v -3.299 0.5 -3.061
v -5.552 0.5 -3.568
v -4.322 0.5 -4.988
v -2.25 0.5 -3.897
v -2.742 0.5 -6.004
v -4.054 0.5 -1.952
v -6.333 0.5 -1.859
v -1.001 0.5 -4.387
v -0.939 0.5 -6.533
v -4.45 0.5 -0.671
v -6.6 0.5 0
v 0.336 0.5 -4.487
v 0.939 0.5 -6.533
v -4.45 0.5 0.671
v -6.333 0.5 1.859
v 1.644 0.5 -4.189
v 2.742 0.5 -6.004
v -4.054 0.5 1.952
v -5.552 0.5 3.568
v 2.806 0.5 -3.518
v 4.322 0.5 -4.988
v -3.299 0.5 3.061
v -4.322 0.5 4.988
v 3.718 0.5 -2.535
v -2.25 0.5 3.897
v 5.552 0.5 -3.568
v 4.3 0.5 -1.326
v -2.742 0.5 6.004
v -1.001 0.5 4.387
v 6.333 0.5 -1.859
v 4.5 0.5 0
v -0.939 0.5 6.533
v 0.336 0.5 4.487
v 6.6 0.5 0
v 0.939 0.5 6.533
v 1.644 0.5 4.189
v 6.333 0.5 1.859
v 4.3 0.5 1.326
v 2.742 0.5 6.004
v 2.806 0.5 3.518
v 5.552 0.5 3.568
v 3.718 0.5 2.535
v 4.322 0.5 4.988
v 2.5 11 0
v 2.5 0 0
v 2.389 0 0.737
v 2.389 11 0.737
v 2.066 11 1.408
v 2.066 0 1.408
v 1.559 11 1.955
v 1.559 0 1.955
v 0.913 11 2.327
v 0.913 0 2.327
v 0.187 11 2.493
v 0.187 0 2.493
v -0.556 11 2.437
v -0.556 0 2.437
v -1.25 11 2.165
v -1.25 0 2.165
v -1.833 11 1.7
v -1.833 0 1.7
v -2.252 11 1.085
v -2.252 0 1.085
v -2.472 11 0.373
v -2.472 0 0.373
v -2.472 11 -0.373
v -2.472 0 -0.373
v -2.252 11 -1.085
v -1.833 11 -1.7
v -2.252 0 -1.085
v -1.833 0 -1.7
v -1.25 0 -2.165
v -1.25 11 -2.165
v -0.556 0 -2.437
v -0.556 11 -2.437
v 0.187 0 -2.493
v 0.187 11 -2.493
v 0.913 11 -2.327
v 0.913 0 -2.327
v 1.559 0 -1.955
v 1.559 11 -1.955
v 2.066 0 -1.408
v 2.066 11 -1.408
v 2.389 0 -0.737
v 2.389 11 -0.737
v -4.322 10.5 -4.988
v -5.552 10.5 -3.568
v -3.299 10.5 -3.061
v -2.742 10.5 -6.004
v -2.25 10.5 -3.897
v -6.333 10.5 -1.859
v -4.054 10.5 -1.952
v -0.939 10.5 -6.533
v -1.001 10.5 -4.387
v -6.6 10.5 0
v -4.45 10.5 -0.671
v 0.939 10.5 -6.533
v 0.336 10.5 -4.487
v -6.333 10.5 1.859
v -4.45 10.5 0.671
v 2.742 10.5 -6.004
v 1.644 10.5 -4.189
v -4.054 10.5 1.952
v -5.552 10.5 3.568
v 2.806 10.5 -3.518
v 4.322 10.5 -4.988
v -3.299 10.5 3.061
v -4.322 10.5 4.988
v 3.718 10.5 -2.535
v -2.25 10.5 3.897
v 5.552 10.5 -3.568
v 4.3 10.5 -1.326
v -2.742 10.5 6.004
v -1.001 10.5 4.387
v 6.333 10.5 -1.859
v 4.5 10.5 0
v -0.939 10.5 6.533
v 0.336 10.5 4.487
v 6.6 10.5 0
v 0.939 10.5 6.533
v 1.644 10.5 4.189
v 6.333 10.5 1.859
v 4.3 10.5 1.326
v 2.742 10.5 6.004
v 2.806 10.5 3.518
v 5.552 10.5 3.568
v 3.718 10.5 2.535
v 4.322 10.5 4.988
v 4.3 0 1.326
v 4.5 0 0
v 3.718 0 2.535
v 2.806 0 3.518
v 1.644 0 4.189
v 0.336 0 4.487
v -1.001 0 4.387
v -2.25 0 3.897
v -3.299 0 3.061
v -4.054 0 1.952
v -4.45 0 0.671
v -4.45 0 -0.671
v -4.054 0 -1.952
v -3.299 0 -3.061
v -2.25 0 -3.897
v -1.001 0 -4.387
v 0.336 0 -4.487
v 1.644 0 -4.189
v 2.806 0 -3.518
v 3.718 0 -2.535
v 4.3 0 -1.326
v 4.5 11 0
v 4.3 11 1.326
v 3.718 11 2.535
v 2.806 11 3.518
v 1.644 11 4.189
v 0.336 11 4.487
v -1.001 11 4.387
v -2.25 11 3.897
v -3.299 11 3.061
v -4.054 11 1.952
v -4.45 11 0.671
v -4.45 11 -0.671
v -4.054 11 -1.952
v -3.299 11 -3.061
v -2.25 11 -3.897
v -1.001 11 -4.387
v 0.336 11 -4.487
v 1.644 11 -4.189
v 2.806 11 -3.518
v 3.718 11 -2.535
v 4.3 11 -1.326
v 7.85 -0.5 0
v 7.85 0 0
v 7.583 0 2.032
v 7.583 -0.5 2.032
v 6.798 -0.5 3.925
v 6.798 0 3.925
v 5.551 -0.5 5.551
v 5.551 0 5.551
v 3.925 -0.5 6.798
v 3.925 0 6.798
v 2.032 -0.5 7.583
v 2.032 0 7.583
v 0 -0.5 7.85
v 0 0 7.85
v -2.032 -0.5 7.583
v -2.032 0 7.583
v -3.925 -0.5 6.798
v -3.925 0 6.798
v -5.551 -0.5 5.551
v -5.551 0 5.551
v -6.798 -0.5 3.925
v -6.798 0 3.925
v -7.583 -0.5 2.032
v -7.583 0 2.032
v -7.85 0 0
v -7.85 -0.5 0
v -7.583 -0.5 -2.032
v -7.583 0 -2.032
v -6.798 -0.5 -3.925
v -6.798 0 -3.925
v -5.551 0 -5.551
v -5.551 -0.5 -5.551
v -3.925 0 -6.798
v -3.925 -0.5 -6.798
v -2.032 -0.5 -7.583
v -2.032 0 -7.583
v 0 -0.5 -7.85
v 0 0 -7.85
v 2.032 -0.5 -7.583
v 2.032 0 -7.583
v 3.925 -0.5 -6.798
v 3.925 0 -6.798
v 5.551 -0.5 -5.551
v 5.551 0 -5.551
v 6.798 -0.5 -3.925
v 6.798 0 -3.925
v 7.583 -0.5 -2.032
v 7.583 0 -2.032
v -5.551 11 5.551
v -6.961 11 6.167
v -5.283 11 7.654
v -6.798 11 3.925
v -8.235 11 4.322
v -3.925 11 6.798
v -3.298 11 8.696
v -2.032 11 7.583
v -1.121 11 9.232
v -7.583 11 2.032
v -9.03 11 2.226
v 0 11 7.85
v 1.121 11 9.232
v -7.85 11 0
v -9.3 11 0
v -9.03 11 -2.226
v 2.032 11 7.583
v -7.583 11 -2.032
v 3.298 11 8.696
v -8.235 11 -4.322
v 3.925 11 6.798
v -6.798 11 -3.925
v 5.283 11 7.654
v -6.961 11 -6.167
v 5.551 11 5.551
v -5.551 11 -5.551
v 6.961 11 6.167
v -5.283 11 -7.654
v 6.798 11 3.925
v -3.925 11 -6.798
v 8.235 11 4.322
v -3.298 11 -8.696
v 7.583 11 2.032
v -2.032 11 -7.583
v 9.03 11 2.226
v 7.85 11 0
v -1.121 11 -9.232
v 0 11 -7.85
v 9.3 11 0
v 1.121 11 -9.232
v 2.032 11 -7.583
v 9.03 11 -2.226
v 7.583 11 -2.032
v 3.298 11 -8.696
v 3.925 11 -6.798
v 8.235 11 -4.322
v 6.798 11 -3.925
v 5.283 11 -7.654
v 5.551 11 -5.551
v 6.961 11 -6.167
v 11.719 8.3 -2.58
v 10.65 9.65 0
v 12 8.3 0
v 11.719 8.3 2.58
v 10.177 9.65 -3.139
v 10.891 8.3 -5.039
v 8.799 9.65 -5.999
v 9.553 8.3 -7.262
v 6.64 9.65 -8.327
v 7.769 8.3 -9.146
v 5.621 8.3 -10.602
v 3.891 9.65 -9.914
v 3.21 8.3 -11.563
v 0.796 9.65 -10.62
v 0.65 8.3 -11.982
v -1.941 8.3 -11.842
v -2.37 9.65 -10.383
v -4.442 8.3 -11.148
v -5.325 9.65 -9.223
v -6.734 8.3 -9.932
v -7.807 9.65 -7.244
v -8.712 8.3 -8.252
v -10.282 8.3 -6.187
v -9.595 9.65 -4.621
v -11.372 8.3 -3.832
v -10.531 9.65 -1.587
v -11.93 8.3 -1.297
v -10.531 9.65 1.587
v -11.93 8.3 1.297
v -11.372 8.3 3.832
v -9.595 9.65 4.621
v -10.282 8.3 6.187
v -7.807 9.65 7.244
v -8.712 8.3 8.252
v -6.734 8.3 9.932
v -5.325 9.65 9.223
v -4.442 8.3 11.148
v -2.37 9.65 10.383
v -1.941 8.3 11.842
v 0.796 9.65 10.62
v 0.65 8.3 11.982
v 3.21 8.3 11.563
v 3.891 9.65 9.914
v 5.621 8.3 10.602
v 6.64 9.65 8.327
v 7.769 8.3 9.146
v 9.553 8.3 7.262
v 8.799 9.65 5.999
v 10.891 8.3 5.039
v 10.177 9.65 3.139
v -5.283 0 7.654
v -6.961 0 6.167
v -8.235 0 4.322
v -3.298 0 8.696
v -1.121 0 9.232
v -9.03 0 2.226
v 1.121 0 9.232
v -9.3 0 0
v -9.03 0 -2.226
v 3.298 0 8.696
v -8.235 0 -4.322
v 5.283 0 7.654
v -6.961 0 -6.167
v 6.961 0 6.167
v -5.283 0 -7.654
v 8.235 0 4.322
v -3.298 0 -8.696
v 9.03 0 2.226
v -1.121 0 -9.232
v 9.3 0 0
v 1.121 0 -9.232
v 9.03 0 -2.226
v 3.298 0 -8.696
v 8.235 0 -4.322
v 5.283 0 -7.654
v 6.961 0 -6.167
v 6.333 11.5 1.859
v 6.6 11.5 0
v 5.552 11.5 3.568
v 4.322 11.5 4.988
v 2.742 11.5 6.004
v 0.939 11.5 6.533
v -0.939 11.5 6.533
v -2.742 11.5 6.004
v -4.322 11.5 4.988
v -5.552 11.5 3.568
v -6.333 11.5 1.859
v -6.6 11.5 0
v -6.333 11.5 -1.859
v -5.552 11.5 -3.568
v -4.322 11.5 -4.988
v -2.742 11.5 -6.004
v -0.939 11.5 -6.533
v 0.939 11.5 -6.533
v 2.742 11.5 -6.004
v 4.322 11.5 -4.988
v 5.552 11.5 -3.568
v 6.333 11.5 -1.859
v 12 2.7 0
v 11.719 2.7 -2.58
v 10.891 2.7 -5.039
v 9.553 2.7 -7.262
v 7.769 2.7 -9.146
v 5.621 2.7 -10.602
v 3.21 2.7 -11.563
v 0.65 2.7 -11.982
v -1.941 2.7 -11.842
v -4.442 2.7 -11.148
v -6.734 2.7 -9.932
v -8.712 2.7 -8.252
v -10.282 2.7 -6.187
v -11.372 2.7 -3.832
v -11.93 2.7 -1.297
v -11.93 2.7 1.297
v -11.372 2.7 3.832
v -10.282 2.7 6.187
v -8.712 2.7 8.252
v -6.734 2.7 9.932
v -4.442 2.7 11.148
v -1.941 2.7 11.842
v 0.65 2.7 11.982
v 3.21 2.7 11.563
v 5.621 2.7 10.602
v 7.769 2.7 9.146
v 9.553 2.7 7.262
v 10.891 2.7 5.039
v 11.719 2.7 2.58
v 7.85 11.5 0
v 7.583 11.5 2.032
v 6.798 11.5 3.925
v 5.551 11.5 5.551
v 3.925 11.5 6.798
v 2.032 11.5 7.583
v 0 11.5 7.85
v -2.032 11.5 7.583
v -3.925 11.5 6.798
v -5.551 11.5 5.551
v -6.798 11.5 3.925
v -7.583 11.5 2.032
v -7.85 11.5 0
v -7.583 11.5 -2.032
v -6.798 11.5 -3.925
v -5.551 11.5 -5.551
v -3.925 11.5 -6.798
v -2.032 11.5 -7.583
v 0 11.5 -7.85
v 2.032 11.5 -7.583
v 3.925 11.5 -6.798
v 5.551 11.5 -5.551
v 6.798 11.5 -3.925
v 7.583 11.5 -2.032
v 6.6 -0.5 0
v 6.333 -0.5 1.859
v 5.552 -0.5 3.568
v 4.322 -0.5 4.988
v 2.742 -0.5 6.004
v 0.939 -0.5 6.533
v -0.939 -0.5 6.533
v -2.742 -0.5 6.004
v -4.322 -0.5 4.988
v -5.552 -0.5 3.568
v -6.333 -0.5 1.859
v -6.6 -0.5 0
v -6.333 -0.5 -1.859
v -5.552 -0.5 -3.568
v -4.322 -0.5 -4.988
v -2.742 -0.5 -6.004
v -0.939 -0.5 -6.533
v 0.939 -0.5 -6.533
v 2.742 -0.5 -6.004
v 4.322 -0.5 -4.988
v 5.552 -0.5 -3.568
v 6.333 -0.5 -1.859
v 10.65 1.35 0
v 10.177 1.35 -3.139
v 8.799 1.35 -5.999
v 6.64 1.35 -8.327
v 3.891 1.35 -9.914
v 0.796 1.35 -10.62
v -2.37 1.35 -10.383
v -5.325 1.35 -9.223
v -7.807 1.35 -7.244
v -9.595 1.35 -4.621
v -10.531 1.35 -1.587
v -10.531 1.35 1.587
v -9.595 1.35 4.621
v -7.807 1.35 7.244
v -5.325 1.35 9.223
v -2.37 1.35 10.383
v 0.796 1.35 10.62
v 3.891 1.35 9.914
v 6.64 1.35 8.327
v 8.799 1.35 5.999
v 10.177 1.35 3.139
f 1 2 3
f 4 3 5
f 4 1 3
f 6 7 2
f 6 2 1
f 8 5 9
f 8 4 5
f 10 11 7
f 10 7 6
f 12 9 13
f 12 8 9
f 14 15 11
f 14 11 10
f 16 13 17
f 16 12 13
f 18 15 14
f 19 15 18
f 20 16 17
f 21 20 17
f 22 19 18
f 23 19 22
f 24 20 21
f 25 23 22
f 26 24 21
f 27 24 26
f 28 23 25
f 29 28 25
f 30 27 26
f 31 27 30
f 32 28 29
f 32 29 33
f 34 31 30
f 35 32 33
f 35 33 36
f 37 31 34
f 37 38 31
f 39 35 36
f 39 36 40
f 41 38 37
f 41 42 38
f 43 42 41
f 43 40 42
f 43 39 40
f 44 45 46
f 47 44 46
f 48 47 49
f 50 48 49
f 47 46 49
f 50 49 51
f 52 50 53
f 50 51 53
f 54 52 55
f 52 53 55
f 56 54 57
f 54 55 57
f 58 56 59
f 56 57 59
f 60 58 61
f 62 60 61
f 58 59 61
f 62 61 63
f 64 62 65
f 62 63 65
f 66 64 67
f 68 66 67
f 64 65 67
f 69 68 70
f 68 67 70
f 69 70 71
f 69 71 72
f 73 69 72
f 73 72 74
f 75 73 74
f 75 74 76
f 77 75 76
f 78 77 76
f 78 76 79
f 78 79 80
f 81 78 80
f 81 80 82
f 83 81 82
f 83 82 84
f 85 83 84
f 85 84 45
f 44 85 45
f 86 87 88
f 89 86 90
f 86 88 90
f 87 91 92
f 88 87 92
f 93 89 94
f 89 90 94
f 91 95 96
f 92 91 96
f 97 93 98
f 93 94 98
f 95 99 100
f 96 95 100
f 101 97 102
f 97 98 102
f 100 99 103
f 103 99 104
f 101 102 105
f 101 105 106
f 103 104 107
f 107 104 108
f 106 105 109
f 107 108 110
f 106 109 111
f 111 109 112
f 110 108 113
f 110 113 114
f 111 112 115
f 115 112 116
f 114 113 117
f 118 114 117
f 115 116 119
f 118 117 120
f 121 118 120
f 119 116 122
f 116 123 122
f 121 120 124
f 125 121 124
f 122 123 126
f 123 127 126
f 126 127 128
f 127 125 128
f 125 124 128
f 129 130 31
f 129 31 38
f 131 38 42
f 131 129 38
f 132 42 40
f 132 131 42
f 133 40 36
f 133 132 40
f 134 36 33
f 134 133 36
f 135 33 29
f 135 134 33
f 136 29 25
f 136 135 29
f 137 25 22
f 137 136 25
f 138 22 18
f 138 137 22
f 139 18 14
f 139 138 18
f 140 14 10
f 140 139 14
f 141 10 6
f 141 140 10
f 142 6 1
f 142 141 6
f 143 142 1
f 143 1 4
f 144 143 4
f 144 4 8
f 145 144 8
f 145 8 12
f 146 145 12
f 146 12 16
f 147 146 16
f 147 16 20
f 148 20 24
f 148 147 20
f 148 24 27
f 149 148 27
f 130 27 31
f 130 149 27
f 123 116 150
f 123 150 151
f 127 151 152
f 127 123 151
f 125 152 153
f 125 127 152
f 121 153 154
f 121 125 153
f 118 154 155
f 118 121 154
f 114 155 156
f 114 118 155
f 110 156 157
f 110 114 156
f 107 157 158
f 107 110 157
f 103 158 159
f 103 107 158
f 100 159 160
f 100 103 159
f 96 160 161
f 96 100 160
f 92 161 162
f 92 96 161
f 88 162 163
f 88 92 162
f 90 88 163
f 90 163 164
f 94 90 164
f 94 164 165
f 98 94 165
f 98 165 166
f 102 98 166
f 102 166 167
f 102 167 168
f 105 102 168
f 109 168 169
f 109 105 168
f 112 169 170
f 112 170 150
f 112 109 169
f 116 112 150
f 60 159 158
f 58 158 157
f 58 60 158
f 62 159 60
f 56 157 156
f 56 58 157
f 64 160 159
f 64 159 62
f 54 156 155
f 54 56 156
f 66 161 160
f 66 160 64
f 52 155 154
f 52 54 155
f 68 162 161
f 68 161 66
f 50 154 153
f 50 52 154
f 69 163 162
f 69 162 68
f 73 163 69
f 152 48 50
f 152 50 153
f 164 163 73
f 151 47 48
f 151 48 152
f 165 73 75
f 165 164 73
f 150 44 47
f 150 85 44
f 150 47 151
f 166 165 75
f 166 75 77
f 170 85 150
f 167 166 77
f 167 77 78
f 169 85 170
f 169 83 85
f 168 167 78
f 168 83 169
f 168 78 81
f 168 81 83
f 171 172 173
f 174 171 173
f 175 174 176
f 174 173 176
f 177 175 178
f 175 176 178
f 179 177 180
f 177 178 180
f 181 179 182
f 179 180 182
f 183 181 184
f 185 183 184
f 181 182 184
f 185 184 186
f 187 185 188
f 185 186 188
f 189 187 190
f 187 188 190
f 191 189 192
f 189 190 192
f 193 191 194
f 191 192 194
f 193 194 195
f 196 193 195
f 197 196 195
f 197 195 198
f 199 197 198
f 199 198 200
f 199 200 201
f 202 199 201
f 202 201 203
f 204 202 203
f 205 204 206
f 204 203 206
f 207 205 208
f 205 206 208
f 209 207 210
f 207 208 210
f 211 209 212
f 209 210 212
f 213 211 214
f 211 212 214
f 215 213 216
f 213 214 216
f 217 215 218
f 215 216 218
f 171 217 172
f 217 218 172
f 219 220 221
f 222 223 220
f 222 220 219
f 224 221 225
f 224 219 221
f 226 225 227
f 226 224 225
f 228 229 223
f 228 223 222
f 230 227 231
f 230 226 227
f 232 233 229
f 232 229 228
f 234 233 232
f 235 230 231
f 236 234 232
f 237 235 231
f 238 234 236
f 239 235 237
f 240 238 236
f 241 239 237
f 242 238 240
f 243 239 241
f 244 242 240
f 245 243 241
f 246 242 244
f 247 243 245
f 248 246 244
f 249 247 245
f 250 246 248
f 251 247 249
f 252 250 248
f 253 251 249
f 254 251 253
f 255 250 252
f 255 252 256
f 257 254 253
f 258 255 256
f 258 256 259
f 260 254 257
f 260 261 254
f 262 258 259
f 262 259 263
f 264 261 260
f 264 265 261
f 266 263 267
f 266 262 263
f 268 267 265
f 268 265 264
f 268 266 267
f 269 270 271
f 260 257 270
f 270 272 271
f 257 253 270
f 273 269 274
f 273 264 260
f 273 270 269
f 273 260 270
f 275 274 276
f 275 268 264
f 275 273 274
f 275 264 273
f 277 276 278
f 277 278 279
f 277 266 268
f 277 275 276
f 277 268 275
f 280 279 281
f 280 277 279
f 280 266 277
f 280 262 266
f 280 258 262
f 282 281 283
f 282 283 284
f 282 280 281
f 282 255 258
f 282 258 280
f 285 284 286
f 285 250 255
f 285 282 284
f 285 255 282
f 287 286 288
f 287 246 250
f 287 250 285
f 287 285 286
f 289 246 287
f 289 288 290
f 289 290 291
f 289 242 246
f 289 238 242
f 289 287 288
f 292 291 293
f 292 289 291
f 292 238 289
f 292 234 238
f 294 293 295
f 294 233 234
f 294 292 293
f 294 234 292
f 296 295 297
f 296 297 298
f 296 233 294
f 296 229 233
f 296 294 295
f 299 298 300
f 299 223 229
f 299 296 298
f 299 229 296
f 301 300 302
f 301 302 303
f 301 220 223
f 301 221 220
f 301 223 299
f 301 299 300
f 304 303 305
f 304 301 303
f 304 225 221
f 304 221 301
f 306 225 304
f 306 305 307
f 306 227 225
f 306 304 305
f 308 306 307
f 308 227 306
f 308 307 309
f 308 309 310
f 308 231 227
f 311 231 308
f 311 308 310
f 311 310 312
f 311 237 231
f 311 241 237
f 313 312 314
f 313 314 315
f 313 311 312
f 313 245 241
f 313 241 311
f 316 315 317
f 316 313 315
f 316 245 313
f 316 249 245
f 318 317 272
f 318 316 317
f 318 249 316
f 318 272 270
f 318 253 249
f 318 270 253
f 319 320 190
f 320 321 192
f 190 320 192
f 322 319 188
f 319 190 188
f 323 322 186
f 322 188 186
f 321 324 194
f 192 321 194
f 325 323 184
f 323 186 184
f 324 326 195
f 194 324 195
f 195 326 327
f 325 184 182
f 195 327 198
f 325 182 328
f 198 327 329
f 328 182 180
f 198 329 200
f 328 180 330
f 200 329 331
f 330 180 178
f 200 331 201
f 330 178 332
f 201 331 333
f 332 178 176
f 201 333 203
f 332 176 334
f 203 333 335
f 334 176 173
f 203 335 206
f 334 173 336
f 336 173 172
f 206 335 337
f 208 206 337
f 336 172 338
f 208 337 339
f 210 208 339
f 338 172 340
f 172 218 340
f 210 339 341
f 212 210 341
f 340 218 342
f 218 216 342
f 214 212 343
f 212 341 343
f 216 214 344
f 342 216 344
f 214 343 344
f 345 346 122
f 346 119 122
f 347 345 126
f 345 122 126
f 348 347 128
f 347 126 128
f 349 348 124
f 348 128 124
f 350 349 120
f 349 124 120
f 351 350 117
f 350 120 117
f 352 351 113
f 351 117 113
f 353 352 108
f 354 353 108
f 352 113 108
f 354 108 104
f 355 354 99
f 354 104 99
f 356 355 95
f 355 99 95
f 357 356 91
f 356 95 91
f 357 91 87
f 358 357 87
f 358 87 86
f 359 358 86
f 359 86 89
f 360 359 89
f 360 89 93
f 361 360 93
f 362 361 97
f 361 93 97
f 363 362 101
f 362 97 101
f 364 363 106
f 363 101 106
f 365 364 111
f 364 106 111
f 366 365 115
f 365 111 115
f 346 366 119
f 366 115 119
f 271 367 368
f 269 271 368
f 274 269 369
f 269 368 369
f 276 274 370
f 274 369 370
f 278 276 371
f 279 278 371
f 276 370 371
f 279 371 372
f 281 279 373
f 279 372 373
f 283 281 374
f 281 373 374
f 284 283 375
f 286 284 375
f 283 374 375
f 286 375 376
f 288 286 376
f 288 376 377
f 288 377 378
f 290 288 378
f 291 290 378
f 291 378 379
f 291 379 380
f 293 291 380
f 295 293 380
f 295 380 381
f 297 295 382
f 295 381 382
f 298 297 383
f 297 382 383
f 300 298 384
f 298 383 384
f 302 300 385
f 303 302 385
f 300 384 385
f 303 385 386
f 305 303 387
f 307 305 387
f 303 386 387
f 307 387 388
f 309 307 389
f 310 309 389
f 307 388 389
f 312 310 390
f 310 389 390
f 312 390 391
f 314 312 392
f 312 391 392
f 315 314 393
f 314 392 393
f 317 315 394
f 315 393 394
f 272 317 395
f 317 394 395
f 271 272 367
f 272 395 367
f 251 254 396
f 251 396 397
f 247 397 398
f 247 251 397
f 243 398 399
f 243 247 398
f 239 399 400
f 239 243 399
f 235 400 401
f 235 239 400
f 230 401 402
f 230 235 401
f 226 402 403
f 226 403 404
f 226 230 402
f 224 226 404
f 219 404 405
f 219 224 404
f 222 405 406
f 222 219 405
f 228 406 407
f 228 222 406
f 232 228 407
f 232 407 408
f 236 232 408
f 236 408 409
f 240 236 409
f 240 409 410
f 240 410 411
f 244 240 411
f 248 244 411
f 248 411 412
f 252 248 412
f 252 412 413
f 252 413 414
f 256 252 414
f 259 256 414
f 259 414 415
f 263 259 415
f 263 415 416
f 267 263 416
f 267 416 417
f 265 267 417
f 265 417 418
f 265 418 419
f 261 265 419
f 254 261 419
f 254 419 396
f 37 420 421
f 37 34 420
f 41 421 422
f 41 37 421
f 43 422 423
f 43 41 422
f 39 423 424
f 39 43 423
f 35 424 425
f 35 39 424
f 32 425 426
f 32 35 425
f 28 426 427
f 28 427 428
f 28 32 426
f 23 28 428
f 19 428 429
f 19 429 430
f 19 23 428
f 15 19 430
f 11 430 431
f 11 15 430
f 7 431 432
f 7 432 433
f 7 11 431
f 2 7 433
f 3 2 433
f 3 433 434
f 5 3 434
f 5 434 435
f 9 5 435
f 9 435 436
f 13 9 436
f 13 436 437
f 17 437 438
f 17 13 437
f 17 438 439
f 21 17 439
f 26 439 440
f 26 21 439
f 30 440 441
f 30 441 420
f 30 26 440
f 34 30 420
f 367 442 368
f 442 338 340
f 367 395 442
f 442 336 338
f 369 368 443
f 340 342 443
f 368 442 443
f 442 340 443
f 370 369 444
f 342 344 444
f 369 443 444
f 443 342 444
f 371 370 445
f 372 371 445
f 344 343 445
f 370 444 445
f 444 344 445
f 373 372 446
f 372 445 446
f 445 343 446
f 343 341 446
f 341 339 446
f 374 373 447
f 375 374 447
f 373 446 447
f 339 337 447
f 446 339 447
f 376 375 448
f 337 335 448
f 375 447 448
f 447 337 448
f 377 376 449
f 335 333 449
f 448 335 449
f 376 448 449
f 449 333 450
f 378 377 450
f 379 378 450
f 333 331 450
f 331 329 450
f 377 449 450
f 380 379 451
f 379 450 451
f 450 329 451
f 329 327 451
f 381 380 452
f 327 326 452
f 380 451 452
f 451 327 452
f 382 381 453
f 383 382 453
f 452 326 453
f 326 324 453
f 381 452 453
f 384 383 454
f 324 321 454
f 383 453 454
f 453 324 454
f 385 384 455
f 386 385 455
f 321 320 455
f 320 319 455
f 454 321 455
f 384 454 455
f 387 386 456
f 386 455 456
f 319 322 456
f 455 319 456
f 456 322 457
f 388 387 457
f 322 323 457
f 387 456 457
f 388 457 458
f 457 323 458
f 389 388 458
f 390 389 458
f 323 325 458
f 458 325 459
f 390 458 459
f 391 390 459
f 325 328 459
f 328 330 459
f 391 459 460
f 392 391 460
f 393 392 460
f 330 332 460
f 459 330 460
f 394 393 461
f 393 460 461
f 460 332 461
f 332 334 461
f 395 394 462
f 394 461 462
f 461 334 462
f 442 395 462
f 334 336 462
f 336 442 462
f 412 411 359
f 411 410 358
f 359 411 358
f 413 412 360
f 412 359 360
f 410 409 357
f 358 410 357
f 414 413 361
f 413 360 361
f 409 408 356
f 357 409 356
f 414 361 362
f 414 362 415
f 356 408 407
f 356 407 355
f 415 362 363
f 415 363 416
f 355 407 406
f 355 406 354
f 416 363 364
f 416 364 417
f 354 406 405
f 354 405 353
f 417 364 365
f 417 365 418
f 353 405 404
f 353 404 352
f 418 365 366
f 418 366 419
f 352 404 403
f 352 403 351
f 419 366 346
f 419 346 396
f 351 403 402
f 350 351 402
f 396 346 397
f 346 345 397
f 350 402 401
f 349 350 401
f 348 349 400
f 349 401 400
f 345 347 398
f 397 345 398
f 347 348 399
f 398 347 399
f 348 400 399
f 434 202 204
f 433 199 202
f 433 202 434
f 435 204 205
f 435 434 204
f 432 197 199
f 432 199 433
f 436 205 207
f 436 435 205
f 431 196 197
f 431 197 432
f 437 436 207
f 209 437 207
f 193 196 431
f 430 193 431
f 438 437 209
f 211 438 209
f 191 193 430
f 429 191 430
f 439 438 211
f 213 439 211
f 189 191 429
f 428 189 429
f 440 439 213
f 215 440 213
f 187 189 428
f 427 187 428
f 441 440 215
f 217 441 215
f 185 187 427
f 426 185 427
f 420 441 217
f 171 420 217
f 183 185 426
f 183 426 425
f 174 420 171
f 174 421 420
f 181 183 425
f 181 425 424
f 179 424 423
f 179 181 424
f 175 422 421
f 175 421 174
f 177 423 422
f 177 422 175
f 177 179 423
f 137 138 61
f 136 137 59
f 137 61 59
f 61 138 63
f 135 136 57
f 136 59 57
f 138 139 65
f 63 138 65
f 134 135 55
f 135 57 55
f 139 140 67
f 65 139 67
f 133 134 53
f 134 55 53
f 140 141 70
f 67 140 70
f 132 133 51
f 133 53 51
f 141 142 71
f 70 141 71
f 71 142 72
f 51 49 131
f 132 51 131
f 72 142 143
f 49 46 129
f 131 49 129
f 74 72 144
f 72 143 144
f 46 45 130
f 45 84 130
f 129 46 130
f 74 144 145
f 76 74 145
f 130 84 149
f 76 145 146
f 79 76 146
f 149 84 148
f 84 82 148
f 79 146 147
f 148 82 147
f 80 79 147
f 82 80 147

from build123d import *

# Parameters (mm, degrees)
SKETCH1_R                = 12
BOSS_EXTRUDE1_DEPTH      = 11
CHAMFER1_SIZE            = 2.7
SKETCH2_R                = 2.5
CUT_EXTRUDE1_DEPTH       = 21.223748416
BOSS_EXTRUDE4_DEPTH      = 0.5
BOSS_EXTRUDE4_DEPTH_BACK = 11.5
SKETCH3_R                = 7.85
SKETCH3_R_2              = 6.6
SKETCH3_4_R              = 6.6
SKETCH3_4_R_2            = 4.5
CUT_EXTRUDE2_DEPTH       = 0.5
CUT_EXTRUDE3_START       = -10.5
SKETCH3_5_R              = 6.6
SKETCH3_5_R_2            = 4.5
CUT_EXTRUDE3_DEPTH       = 0.5


with BuildPart() as part:
    # Sketch1 → Boss-Extrude1 (new body)
    with BuildSketch(Plane(origin=(0, 0, 0), x_dir=(1, 0, 0), z_dir=(0, 1, 0))):
        Circle(SKETCH1_R)
    extrude(amount=BOSS_EXTRUDE1_DEPTH)

    # Chamfer1
    chamfer1_edges = [part.edges().sort_by_distance(p)[0] for p in [
        (-12, 0, 0),
        (-12, 11, 0),
    ]]
    chamfer(chamfer1_edges, length=CHAMFER1_SIZE)

    # Sketch2 → Cut-Extrude1 (cut, through all)
    with BuildSketch(Plane.XZ):
        Circle(SKETCH2_R)
    extrude(amount=-CUT_EXTRUDE1_DEPTH, mode=Mode.SUBTRACT)

    # Sketch3 → Boss-Extrude4 (add, two sides: drawn at the far end of the back side and taken through both)
    with BuildSketch(Plane.XZ.offset(-BOSS_EXTRUDE4_DEPTH_BACK)):
        Circle(SKETCH3_R)
        Circle(SKETCH3_R_2, mode=Mode.SUBTRACT)
    extrude(amount=BOSS_EXTRUDE4_DEPTH + BOSS_EXTRUDE4_DEPTH_BACK)

    # Sketch3<4> → Cut-Extrude2 (cut)
    with BuildSketch(Plane.XZ):
        Circle(SKETCH3_4_R)
        Circle(SKETCH3_4_R_2, mode=Mode.SUBTRACT)
    extrude(amount=-CUT_EXTRUDE2_DEPTH, mode=Mode.SUBTRACT)

    # Sketch3<5> → Cut-Extrude3 (cut)
    with BuildSketch(Plane.XZ.offset(CUT_EXTRUDE3_START)):
        Circle(SKETCH3_5_R)
        Circle(SKETCH3_5_R_2, mode=Mode.SUBTRACT)
    extrude(amount=-CUT_EXTRUDE3_DEPTH, mode=Mode.SUBTRACT)


solid = part.part
